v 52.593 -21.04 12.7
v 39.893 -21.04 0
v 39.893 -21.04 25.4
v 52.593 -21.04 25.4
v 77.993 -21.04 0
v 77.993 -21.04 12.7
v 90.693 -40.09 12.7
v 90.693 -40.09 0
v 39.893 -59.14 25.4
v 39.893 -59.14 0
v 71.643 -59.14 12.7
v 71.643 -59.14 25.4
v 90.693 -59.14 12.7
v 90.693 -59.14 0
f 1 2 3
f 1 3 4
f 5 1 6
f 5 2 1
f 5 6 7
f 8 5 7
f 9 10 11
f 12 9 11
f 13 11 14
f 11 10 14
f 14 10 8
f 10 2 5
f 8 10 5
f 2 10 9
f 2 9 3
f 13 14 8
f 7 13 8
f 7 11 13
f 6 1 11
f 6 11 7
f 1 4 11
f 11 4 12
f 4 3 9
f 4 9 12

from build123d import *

# Parameters (mm, degrees)
F0_W     = 50.8
F0_H     = 38.1
F1_DEPTH = 25.4
F3_DEPTH = 12.7
F5_DEPTH = 25.4


with BuildPart() as f1:
    # F0 (on Top) → F1 (new body)
    with BuildSketch(Plane.XY):
        with Locations((65.2933099031, -40.0903208673)):
            Rectangle(F0_W, F0_H)
    extrude(amount=F1_DEPTH)

    # F2 (on face) → F3 (cut)
    with BuildSketch(Plane.XY.offset(25.4)):
        Polygon((90.6933099031, -21.0403208673), (52.5933099031, -21.0403208673), (71.6433099031, -59.1403208673), (90.6933099031, -59.1403208673), align=None)
    extrude(amount=-F3_DEPTH, mode=Mode.SUBTRACT)

    # F4 (on face) → F5 (cut)
    with BuildSketch(Plane.XY.offset(12.7)):
        Polygon((90.6933099031, -21.0403208673), (77.9933099031, -21.0403208673), (90.6933099031, -40.0903208673), align=None)
    extrude(amount=-F5_DEPTH, mode=Mode.SUBTRACT)


solid = f1.part
